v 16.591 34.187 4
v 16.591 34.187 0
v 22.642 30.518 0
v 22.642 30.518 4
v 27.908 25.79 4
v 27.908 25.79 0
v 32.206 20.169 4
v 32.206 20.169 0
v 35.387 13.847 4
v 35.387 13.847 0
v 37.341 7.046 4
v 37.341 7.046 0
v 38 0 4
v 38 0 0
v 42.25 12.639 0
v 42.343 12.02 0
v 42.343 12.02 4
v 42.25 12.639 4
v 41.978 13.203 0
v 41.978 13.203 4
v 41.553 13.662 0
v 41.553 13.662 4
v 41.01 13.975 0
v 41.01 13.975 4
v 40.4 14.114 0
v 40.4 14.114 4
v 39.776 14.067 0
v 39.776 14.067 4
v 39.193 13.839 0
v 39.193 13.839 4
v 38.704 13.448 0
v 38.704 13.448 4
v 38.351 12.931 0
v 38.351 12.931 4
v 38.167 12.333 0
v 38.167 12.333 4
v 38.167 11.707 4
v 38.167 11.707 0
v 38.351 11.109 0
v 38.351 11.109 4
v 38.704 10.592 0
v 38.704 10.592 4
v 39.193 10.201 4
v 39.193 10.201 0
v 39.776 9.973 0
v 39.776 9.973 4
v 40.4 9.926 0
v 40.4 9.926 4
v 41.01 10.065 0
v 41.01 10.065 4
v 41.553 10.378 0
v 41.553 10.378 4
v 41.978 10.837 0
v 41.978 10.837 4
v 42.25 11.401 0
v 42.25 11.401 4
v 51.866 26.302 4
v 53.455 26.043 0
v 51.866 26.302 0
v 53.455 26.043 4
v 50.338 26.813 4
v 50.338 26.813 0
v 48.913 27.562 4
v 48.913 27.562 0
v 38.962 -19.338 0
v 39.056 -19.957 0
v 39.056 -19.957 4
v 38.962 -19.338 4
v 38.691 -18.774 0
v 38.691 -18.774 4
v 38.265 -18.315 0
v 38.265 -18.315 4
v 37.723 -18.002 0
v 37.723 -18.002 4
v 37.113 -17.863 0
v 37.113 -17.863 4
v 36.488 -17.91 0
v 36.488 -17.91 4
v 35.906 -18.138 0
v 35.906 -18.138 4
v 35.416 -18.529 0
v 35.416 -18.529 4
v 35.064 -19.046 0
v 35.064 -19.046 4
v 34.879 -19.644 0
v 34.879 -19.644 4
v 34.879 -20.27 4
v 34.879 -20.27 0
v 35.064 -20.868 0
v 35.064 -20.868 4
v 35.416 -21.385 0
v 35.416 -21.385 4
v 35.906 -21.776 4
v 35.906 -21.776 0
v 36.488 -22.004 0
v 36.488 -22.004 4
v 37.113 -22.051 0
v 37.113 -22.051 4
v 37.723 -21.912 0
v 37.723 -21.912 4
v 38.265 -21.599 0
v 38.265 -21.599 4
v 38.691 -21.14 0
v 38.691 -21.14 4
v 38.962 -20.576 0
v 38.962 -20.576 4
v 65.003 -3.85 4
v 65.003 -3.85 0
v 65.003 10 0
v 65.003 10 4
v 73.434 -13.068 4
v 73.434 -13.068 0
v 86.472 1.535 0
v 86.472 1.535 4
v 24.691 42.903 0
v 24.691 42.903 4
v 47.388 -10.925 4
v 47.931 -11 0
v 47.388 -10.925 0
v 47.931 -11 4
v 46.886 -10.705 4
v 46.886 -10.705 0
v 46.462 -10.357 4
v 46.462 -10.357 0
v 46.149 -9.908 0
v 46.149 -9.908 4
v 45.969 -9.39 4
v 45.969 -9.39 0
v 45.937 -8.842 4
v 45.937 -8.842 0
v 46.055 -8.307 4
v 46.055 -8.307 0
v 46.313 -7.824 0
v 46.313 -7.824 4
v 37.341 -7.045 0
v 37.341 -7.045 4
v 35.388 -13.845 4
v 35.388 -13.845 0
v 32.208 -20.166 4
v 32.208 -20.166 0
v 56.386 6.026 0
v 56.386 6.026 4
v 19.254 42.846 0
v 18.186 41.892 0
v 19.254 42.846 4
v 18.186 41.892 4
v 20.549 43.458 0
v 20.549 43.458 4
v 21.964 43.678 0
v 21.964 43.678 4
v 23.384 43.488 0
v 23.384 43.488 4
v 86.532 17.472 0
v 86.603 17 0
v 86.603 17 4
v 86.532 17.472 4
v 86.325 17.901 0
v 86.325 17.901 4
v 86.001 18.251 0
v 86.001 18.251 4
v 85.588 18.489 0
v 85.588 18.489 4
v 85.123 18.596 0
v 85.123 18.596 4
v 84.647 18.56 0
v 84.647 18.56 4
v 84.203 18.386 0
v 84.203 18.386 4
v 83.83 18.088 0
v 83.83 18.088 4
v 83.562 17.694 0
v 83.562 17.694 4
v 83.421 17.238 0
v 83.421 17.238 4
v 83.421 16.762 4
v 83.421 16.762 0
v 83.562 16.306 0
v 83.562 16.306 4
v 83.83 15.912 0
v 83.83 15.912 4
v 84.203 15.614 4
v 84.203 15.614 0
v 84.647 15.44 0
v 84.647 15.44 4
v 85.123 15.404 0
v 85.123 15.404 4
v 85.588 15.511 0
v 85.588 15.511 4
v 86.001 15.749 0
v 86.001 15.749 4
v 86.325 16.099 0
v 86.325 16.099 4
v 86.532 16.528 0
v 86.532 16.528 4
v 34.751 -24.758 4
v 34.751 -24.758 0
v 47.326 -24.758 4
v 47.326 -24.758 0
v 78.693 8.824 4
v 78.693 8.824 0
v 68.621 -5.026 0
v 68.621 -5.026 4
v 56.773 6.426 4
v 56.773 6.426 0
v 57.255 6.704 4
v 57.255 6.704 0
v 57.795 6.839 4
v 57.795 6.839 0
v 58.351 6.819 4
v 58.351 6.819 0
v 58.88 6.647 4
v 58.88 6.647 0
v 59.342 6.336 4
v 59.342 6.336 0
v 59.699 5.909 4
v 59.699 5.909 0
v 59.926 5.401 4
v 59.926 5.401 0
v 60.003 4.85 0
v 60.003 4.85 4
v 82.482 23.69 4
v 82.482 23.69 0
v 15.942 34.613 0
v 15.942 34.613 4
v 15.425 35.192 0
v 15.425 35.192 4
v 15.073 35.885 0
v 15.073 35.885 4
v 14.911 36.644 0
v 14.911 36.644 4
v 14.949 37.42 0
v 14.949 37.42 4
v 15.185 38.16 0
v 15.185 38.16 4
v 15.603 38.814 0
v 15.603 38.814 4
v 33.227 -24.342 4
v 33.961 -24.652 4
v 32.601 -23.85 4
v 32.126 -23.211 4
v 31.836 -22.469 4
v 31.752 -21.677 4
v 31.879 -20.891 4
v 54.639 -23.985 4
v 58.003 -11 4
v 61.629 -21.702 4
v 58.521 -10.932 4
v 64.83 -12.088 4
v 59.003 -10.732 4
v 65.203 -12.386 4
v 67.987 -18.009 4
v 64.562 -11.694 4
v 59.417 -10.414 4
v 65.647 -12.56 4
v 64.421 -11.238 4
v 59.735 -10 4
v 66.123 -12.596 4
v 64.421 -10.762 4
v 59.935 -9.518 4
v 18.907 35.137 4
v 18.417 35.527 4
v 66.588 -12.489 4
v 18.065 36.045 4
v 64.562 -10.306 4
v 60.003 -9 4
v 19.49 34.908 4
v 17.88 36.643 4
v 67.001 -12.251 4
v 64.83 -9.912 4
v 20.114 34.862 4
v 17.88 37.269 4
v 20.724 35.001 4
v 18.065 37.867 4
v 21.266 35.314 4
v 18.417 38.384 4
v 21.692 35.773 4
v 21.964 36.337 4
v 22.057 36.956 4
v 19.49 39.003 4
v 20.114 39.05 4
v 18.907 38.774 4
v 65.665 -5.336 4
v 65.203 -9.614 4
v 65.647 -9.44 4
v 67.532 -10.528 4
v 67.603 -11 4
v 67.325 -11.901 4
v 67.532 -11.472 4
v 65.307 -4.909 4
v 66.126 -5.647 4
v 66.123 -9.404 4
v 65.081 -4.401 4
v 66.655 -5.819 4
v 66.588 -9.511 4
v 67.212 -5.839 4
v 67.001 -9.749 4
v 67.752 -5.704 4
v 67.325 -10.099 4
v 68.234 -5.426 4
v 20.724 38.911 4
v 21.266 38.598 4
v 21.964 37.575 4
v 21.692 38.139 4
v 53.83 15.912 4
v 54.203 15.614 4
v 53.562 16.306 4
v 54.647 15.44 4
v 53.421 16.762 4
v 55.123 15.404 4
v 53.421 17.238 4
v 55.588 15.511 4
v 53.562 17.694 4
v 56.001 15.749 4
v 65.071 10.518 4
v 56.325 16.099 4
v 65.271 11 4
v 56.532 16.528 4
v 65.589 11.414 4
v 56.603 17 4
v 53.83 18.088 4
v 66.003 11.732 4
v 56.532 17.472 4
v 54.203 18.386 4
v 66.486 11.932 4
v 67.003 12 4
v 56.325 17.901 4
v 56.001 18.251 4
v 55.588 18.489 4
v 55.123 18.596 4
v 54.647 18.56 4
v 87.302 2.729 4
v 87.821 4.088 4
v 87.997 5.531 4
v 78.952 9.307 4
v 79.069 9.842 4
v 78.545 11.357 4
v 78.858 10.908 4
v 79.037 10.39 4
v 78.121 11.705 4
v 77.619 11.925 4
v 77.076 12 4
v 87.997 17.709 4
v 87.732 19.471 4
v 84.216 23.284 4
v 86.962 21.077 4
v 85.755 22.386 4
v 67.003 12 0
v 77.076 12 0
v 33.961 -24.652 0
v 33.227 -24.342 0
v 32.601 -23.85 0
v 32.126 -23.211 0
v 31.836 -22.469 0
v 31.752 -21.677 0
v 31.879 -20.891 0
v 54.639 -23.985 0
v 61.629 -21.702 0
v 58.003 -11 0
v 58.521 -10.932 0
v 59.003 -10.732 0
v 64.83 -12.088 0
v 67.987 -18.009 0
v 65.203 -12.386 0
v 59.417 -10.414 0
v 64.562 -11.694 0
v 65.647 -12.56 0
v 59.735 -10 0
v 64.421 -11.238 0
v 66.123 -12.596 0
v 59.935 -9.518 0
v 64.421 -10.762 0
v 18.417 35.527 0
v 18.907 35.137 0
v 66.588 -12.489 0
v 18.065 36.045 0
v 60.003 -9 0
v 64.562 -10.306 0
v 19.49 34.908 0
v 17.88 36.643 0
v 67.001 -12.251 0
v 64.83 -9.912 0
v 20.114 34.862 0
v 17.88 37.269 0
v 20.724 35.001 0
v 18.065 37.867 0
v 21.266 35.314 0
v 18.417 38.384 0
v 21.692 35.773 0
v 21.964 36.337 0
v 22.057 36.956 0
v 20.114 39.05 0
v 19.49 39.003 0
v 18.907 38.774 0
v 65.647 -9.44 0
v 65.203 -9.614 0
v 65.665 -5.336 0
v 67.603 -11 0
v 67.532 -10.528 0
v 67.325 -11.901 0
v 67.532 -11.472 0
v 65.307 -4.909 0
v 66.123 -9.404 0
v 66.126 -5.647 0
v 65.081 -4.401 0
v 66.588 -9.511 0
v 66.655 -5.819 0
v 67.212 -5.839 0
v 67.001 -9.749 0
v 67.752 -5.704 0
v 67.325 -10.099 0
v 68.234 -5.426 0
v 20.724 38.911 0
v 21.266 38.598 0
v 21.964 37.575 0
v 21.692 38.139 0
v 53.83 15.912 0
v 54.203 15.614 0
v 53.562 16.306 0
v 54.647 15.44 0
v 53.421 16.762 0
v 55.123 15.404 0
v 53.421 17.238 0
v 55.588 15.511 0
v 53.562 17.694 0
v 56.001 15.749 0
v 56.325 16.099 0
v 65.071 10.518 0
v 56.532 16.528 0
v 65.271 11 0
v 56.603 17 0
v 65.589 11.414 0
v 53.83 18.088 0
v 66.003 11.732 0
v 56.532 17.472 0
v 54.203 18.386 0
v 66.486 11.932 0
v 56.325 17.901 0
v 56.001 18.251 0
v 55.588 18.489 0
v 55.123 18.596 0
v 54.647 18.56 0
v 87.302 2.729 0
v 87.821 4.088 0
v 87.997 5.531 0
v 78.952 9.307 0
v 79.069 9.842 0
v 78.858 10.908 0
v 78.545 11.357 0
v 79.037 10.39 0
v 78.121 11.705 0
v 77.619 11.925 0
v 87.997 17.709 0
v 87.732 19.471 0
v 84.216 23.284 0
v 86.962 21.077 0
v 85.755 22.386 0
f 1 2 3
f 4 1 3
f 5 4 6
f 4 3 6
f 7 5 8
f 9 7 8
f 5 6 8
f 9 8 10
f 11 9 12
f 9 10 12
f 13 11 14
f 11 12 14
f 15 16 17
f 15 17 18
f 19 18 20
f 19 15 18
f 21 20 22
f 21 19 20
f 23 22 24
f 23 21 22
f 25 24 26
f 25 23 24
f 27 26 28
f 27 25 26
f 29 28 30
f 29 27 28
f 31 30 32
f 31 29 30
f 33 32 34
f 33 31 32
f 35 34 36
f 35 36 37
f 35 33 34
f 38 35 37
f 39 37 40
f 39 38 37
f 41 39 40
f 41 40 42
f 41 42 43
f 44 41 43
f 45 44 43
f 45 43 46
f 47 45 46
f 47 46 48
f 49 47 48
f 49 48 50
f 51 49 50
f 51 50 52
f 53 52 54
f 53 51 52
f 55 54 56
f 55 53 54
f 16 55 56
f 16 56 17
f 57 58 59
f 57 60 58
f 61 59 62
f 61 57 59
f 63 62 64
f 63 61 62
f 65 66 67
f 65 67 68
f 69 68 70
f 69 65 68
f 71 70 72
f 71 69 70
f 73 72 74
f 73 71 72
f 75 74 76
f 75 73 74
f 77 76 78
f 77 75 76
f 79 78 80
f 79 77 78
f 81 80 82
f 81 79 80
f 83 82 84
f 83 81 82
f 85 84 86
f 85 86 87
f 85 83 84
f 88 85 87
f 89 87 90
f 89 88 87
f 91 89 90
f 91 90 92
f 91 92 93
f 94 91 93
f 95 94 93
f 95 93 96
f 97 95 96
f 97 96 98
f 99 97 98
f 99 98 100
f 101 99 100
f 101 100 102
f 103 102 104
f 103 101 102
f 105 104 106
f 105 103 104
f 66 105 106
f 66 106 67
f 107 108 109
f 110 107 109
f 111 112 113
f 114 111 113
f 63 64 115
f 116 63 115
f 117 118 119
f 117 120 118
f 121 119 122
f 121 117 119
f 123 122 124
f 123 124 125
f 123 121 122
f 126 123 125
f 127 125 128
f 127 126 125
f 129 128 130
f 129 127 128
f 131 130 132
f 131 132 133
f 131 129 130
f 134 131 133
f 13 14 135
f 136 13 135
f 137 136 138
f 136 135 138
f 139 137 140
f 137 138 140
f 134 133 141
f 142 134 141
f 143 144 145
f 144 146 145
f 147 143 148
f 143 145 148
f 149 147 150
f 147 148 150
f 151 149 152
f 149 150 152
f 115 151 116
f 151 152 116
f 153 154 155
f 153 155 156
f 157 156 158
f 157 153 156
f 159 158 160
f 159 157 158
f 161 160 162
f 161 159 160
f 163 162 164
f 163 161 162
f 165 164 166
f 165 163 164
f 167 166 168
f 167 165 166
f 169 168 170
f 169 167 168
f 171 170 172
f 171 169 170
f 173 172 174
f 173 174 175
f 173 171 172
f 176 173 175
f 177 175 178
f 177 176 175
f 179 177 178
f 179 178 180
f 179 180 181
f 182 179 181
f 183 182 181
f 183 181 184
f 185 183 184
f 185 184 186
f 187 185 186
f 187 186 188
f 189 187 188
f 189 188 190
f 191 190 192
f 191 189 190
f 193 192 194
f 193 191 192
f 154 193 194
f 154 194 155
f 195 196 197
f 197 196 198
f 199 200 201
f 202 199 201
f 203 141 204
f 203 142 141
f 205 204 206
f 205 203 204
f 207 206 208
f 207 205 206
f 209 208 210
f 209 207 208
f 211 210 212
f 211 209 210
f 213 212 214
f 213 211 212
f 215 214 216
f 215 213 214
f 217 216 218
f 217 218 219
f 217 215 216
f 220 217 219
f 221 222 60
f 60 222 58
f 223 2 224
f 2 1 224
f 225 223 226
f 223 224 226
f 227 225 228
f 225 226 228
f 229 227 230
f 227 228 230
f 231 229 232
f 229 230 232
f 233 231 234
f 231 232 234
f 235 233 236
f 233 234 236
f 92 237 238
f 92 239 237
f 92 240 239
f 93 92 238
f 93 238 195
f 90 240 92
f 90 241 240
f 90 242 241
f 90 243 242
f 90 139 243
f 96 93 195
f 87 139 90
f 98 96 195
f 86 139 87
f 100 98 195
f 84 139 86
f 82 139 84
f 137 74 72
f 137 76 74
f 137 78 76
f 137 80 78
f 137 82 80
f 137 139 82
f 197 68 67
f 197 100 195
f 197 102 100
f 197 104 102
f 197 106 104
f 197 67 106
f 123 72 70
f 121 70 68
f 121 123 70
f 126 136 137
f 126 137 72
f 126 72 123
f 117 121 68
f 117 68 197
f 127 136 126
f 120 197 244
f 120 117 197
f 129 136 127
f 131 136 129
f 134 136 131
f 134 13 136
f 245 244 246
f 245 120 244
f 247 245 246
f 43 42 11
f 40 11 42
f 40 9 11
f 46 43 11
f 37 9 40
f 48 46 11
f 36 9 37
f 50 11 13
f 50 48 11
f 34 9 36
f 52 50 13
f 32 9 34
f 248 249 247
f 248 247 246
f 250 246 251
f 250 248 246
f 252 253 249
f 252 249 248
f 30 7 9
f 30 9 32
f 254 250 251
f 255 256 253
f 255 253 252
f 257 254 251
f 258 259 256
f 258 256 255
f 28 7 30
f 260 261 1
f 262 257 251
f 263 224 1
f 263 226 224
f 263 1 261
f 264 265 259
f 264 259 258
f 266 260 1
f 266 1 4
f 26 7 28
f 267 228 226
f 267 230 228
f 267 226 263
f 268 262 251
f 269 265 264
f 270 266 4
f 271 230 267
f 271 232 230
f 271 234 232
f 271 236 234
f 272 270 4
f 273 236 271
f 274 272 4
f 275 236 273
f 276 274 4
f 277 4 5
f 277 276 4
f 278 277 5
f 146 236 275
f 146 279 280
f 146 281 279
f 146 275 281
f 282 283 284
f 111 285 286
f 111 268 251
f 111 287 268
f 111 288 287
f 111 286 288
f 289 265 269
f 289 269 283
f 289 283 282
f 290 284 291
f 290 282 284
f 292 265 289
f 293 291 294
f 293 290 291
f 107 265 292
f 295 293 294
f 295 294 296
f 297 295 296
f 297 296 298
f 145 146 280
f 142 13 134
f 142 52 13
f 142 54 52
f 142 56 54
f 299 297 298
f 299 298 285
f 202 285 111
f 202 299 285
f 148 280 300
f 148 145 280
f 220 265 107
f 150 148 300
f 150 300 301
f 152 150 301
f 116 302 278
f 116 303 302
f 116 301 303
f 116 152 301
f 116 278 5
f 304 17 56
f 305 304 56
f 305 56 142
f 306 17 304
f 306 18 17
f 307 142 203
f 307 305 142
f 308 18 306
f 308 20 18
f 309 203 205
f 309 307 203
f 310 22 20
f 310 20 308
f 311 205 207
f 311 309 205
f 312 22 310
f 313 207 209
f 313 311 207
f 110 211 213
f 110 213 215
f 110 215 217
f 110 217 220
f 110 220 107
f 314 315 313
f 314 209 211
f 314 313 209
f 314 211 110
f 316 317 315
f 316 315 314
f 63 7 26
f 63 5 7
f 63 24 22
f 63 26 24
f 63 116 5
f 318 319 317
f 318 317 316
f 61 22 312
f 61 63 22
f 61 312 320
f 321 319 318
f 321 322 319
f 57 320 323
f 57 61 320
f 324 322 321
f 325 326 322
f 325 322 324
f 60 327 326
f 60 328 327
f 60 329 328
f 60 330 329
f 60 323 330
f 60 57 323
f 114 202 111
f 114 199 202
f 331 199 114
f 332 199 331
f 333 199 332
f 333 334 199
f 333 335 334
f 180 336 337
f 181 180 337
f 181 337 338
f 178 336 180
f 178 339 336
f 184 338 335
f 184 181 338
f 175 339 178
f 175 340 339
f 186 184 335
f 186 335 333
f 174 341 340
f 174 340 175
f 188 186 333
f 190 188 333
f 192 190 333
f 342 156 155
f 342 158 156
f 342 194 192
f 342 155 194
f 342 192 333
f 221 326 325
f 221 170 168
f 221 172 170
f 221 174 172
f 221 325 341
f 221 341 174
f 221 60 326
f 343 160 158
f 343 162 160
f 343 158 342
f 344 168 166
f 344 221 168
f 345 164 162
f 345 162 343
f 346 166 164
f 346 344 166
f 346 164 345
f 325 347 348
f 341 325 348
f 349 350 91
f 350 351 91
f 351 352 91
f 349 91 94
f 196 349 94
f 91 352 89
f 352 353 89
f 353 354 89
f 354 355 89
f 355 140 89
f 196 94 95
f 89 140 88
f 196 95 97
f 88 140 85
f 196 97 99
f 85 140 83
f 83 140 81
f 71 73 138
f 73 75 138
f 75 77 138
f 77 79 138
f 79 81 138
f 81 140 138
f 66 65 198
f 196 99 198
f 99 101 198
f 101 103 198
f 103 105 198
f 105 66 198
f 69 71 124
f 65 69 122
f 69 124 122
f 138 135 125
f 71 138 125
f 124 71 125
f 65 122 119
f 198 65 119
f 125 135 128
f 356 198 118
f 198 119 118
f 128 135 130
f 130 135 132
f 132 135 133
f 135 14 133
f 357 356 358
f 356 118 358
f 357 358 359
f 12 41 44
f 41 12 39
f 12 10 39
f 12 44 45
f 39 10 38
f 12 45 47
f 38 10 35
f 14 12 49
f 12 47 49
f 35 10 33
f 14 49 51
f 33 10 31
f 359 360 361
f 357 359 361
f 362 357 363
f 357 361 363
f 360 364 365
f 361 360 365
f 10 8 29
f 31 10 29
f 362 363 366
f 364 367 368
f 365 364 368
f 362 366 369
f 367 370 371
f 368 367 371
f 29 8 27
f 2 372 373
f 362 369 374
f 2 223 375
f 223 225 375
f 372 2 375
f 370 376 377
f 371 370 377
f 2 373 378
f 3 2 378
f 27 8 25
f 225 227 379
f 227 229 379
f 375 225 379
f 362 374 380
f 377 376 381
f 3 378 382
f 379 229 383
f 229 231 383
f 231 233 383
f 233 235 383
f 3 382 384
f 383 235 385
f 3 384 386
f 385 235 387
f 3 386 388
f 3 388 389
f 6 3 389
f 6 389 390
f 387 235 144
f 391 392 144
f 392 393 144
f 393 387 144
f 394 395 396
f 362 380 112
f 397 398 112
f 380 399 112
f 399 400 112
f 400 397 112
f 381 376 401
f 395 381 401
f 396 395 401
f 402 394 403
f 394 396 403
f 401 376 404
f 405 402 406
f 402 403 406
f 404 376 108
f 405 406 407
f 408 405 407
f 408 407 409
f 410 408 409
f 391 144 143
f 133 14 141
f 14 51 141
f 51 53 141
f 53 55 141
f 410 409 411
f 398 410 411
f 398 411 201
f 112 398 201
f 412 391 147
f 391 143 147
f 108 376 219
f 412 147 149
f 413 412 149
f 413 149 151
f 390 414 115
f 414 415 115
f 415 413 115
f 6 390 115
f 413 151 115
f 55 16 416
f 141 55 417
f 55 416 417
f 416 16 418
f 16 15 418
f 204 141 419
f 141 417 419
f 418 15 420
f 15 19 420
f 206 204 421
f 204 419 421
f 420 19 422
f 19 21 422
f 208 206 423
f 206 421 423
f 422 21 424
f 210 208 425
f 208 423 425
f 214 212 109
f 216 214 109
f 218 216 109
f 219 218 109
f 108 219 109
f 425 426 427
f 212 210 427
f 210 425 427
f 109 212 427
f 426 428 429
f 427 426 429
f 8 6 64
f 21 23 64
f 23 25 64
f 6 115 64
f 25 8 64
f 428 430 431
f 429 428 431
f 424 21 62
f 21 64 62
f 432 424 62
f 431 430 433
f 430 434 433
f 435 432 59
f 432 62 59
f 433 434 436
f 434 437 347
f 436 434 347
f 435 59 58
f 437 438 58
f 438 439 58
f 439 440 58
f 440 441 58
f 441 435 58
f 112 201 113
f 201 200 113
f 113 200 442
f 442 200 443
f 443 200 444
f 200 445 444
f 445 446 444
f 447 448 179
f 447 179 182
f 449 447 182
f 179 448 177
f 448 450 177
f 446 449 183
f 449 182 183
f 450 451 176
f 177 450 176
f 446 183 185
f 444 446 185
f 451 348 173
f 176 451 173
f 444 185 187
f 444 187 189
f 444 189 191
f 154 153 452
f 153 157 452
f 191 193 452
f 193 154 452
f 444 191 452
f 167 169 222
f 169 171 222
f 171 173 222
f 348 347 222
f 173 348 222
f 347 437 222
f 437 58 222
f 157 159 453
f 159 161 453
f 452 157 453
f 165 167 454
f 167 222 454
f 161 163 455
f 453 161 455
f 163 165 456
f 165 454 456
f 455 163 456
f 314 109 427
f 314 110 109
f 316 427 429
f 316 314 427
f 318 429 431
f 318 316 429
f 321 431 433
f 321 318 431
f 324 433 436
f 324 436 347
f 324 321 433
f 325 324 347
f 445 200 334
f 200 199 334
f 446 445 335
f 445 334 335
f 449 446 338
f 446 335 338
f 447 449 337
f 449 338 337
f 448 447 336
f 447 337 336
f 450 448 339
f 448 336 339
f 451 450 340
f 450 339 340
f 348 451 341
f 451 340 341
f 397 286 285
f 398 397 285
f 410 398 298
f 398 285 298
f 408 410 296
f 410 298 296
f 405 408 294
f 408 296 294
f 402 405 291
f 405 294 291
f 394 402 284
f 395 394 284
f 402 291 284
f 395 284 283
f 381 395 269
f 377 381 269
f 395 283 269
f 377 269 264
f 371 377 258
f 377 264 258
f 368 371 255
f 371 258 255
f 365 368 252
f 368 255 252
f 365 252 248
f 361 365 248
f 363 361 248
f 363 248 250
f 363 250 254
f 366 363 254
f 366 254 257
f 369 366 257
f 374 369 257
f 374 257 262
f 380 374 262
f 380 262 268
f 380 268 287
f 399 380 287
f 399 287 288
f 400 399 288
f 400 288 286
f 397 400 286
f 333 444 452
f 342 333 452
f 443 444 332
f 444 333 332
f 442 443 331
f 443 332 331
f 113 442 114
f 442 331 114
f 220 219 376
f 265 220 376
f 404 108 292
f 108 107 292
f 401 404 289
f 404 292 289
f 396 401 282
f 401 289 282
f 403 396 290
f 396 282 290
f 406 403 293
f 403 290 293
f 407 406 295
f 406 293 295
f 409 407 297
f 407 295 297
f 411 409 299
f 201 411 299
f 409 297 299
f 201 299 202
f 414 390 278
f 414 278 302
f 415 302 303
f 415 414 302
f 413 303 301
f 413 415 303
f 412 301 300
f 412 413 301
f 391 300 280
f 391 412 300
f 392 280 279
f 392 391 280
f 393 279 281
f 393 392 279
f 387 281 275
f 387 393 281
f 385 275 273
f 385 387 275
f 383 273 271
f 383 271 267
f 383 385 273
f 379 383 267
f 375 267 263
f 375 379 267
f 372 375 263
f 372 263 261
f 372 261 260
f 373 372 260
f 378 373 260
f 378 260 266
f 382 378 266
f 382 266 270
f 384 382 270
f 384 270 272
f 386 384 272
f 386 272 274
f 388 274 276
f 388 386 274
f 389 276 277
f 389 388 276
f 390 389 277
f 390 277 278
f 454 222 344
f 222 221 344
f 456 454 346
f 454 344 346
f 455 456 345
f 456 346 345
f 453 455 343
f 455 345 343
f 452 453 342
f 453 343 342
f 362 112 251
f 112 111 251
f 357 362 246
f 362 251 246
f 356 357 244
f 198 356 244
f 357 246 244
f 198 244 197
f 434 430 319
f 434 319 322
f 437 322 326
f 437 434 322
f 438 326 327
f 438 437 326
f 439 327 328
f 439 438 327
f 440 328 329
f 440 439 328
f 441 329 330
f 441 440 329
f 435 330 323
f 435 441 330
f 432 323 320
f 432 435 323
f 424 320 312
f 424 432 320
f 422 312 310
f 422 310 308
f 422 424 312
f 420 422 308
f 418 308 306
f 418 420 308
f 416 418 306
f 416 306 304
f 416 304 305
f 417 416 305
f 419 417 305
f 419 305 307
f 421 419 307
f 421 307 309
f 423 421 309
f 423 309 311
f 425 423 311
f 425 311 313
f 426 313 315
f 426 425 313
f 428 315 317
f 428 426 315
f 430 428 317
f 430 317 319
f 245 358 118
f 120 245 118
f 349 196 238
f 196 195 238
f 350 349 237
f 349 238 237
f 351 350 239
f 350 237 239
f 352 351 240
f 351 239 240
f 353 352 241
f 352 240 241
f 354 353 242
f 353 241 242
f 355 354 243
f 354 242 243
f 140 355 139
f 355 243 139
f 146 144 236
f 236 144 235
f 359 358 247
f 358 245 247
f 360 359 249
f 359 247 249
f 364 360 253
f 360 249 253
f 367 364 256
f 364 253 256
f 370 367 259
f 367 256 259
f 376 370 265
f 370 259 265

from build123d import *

# Parameters (mm, degrees)
SKETCH_3_R          = 2.1
EXTRUDE_2_DEPTH     = 4
FILLET_1_R          = 5
FILLET_3_R          = 6
FILLET_4_R          = 10
FILLET_5_R          = 35
CUT_EXTRUDE_START   = -4
SKETCH_4_R          = 1.6
SKETCH_4_R_2        = 2.1
CUT_EXTRUDE_1_DEPTH = 4
SKETCH_5_R          = 1.6
CUT_EXTRUDE_2_DEPTH = 4
FILLET_7_R          = 2
FILLET_8_R          = 2
FILLET_9_R          = 3
SKETCH_7_R          = 1.6
CUT_EXTRUDE_3_DEPTH = 10


with BuildPart() as part:
    # 草图3 → 凸台-拉伸2 (new body)
    with BuildSketch(Plane.XY):
        with BuildLine():
            Line((20.996765446, 45.242348331), (12.996765446, 35.70831959))
            ThreePointArc((12.996765446, 35.70831959), (31.127777683, 21.795904581), (38, 0))
            ThreePointArc((38, 0), (35.633322615, -13.20099691), (28.828088452, -24.757651669))
            Line((28.828088452, -24.757651669), (62.996765446, -24.757651669))
            Line((62.996765446, -24.757651669), (87.996765446, 3.242348331))
            Line((87.996765446, 3.242348331), (87.996765446, 23.242348331))
            Line((87.996765446, 23.242348331), (50.996765446, 26.242348331))
            Line((50.996765446, 26.242348331), (20.996765446, 45.242348331))
        make_face()
        with Locations((36.955694518, -19.956869561)):
            Circle(SKETCH_3_R, mode=Mode.SUBTRACT)
        with Locations((19.956869561, 36.955694518)):
            Circle(SKETCH_3_R, mode=Mode.SUBTRACT)
        with Locations((40.243259995, 12.019984399)):
            Circle(SKETCH_3_R, mode=Mode.SUBTRACT)
    extrude(amount=EXTRUDE_2_DEPTH)

    # 圆角1
    fillet_1_edges = [part.edges().sort_by_distance(p)[0] for p in [
        (20.996765446, 45.242348331, 2),
    ]]
    fillet(fillet_1_edges, radius=FILLET_1_R)

    # 圆角3
    fillet_3_edges = [part.edges().sort_by_distance(p)[0] for p in [
        (87.996765446, 23.242348331, 2),
        (87.996765446, 3.242348331, 2),
    ]]
    fillet(fillet_3_edges, radius=FILLET_3_R)

    # 圆角4
    fillet_4_edges = [part.edges().sort_by_distance(p)[0] for p in [
        (50.996765446, 26.242348331, 2),
    ]]
    fillet(fillet_4_edges, radius=FILLET_4_R)

    # 圆角5
    fillet_5_edges = [part.edges().sort_by_distance(p)[0] for p in [
        (62.996765446, -24.757651669, 2),
    ]]
    fillet(fillet_5_edges, radius=FILLET_5_R)

    # 草图4 → 切除-拉伸1 (cut)
    with BuildSketch(Plane.XY.offset(4).offset(CUT_EXTRUDE_START)):
        with Locations((55.003259995, 16.999984399)):
            Circle(SKETCH_4_R)
        with Locations((40.243259995, 12.019984399)):
            Circle(SKETCH_4_R_2)
        with Locations((85.003259995, 16.999984399)):
            Circle(SKETCH_4_R)
    extrude(amount=CUT_EXTRUDE_1_DEPTH, mode=Mode.SUBTRACT)

    # 草图5 → 切除-拉伸2 (cut)
    with BuildSketch(Plane.XY.offset(4).offset(CUT_EXTRUDE_START)):
        with Locations((55.003259995, 16.999984399)):
            Circle(SKETCH_5_R)
        Polygon((65.003259995, 11.999984399), (81.003259995, 11.999984399), (65.003259995, -10.000015601), align=None)
        Polygon((60.003259995, 10.999984399), (60.003259995, -11.000015601), (44.003259995, -11.000015601), align=None)
    extrude(amount=CUT_EXTRUDE_2_DEPTH, mode=Mode.SUBTRACT)

    # 圆角7
    fillet_7_edges = [part.edges().sort_by_distance(p)[0] for p in [
        (65.003259995, 11.999984399, 2),
        (60.003259995, -11.000015601, 2),
    ]]
    fillet(fillet_7_edges, radius=FILLET_7_R)

    # 圆角8
    fillet_8_edges = [part.edges().sort_by_distance(p)[0] for p in [
        (65.003259995, -10.000015601, 2),
        (81.003259995, 11.999984399, 2),
        (44.003259995, -11.000015601, 2),
        (60.003259995, 10.999984399, 2),
    ]]
    fillet(fillet_8_edges, radius=FILLET_8_R)

    # 圆角9
    fillet_9_edges = [part.edges().sort_by_distance(p)[0] for p in [
        (12.996765446, 35.70831959, 2),
        (28.828088452, -24.757651669, 2),
    ]]
    fillet(fillet_9_edges, radius=FILLET_9_R)

    # 草图7 → 切除-拉伸3 (cut)
    with BuildSketch(Plane.XY.offset(4)):
        with Locations((66.003259995, -11.000015601)):
            Circle(SKETCH_7_R)
    extrude(amount=-CUT_EXTRUDE_3_DEPTH, mode=Mode.SUBTRACT)


solid = part.part
